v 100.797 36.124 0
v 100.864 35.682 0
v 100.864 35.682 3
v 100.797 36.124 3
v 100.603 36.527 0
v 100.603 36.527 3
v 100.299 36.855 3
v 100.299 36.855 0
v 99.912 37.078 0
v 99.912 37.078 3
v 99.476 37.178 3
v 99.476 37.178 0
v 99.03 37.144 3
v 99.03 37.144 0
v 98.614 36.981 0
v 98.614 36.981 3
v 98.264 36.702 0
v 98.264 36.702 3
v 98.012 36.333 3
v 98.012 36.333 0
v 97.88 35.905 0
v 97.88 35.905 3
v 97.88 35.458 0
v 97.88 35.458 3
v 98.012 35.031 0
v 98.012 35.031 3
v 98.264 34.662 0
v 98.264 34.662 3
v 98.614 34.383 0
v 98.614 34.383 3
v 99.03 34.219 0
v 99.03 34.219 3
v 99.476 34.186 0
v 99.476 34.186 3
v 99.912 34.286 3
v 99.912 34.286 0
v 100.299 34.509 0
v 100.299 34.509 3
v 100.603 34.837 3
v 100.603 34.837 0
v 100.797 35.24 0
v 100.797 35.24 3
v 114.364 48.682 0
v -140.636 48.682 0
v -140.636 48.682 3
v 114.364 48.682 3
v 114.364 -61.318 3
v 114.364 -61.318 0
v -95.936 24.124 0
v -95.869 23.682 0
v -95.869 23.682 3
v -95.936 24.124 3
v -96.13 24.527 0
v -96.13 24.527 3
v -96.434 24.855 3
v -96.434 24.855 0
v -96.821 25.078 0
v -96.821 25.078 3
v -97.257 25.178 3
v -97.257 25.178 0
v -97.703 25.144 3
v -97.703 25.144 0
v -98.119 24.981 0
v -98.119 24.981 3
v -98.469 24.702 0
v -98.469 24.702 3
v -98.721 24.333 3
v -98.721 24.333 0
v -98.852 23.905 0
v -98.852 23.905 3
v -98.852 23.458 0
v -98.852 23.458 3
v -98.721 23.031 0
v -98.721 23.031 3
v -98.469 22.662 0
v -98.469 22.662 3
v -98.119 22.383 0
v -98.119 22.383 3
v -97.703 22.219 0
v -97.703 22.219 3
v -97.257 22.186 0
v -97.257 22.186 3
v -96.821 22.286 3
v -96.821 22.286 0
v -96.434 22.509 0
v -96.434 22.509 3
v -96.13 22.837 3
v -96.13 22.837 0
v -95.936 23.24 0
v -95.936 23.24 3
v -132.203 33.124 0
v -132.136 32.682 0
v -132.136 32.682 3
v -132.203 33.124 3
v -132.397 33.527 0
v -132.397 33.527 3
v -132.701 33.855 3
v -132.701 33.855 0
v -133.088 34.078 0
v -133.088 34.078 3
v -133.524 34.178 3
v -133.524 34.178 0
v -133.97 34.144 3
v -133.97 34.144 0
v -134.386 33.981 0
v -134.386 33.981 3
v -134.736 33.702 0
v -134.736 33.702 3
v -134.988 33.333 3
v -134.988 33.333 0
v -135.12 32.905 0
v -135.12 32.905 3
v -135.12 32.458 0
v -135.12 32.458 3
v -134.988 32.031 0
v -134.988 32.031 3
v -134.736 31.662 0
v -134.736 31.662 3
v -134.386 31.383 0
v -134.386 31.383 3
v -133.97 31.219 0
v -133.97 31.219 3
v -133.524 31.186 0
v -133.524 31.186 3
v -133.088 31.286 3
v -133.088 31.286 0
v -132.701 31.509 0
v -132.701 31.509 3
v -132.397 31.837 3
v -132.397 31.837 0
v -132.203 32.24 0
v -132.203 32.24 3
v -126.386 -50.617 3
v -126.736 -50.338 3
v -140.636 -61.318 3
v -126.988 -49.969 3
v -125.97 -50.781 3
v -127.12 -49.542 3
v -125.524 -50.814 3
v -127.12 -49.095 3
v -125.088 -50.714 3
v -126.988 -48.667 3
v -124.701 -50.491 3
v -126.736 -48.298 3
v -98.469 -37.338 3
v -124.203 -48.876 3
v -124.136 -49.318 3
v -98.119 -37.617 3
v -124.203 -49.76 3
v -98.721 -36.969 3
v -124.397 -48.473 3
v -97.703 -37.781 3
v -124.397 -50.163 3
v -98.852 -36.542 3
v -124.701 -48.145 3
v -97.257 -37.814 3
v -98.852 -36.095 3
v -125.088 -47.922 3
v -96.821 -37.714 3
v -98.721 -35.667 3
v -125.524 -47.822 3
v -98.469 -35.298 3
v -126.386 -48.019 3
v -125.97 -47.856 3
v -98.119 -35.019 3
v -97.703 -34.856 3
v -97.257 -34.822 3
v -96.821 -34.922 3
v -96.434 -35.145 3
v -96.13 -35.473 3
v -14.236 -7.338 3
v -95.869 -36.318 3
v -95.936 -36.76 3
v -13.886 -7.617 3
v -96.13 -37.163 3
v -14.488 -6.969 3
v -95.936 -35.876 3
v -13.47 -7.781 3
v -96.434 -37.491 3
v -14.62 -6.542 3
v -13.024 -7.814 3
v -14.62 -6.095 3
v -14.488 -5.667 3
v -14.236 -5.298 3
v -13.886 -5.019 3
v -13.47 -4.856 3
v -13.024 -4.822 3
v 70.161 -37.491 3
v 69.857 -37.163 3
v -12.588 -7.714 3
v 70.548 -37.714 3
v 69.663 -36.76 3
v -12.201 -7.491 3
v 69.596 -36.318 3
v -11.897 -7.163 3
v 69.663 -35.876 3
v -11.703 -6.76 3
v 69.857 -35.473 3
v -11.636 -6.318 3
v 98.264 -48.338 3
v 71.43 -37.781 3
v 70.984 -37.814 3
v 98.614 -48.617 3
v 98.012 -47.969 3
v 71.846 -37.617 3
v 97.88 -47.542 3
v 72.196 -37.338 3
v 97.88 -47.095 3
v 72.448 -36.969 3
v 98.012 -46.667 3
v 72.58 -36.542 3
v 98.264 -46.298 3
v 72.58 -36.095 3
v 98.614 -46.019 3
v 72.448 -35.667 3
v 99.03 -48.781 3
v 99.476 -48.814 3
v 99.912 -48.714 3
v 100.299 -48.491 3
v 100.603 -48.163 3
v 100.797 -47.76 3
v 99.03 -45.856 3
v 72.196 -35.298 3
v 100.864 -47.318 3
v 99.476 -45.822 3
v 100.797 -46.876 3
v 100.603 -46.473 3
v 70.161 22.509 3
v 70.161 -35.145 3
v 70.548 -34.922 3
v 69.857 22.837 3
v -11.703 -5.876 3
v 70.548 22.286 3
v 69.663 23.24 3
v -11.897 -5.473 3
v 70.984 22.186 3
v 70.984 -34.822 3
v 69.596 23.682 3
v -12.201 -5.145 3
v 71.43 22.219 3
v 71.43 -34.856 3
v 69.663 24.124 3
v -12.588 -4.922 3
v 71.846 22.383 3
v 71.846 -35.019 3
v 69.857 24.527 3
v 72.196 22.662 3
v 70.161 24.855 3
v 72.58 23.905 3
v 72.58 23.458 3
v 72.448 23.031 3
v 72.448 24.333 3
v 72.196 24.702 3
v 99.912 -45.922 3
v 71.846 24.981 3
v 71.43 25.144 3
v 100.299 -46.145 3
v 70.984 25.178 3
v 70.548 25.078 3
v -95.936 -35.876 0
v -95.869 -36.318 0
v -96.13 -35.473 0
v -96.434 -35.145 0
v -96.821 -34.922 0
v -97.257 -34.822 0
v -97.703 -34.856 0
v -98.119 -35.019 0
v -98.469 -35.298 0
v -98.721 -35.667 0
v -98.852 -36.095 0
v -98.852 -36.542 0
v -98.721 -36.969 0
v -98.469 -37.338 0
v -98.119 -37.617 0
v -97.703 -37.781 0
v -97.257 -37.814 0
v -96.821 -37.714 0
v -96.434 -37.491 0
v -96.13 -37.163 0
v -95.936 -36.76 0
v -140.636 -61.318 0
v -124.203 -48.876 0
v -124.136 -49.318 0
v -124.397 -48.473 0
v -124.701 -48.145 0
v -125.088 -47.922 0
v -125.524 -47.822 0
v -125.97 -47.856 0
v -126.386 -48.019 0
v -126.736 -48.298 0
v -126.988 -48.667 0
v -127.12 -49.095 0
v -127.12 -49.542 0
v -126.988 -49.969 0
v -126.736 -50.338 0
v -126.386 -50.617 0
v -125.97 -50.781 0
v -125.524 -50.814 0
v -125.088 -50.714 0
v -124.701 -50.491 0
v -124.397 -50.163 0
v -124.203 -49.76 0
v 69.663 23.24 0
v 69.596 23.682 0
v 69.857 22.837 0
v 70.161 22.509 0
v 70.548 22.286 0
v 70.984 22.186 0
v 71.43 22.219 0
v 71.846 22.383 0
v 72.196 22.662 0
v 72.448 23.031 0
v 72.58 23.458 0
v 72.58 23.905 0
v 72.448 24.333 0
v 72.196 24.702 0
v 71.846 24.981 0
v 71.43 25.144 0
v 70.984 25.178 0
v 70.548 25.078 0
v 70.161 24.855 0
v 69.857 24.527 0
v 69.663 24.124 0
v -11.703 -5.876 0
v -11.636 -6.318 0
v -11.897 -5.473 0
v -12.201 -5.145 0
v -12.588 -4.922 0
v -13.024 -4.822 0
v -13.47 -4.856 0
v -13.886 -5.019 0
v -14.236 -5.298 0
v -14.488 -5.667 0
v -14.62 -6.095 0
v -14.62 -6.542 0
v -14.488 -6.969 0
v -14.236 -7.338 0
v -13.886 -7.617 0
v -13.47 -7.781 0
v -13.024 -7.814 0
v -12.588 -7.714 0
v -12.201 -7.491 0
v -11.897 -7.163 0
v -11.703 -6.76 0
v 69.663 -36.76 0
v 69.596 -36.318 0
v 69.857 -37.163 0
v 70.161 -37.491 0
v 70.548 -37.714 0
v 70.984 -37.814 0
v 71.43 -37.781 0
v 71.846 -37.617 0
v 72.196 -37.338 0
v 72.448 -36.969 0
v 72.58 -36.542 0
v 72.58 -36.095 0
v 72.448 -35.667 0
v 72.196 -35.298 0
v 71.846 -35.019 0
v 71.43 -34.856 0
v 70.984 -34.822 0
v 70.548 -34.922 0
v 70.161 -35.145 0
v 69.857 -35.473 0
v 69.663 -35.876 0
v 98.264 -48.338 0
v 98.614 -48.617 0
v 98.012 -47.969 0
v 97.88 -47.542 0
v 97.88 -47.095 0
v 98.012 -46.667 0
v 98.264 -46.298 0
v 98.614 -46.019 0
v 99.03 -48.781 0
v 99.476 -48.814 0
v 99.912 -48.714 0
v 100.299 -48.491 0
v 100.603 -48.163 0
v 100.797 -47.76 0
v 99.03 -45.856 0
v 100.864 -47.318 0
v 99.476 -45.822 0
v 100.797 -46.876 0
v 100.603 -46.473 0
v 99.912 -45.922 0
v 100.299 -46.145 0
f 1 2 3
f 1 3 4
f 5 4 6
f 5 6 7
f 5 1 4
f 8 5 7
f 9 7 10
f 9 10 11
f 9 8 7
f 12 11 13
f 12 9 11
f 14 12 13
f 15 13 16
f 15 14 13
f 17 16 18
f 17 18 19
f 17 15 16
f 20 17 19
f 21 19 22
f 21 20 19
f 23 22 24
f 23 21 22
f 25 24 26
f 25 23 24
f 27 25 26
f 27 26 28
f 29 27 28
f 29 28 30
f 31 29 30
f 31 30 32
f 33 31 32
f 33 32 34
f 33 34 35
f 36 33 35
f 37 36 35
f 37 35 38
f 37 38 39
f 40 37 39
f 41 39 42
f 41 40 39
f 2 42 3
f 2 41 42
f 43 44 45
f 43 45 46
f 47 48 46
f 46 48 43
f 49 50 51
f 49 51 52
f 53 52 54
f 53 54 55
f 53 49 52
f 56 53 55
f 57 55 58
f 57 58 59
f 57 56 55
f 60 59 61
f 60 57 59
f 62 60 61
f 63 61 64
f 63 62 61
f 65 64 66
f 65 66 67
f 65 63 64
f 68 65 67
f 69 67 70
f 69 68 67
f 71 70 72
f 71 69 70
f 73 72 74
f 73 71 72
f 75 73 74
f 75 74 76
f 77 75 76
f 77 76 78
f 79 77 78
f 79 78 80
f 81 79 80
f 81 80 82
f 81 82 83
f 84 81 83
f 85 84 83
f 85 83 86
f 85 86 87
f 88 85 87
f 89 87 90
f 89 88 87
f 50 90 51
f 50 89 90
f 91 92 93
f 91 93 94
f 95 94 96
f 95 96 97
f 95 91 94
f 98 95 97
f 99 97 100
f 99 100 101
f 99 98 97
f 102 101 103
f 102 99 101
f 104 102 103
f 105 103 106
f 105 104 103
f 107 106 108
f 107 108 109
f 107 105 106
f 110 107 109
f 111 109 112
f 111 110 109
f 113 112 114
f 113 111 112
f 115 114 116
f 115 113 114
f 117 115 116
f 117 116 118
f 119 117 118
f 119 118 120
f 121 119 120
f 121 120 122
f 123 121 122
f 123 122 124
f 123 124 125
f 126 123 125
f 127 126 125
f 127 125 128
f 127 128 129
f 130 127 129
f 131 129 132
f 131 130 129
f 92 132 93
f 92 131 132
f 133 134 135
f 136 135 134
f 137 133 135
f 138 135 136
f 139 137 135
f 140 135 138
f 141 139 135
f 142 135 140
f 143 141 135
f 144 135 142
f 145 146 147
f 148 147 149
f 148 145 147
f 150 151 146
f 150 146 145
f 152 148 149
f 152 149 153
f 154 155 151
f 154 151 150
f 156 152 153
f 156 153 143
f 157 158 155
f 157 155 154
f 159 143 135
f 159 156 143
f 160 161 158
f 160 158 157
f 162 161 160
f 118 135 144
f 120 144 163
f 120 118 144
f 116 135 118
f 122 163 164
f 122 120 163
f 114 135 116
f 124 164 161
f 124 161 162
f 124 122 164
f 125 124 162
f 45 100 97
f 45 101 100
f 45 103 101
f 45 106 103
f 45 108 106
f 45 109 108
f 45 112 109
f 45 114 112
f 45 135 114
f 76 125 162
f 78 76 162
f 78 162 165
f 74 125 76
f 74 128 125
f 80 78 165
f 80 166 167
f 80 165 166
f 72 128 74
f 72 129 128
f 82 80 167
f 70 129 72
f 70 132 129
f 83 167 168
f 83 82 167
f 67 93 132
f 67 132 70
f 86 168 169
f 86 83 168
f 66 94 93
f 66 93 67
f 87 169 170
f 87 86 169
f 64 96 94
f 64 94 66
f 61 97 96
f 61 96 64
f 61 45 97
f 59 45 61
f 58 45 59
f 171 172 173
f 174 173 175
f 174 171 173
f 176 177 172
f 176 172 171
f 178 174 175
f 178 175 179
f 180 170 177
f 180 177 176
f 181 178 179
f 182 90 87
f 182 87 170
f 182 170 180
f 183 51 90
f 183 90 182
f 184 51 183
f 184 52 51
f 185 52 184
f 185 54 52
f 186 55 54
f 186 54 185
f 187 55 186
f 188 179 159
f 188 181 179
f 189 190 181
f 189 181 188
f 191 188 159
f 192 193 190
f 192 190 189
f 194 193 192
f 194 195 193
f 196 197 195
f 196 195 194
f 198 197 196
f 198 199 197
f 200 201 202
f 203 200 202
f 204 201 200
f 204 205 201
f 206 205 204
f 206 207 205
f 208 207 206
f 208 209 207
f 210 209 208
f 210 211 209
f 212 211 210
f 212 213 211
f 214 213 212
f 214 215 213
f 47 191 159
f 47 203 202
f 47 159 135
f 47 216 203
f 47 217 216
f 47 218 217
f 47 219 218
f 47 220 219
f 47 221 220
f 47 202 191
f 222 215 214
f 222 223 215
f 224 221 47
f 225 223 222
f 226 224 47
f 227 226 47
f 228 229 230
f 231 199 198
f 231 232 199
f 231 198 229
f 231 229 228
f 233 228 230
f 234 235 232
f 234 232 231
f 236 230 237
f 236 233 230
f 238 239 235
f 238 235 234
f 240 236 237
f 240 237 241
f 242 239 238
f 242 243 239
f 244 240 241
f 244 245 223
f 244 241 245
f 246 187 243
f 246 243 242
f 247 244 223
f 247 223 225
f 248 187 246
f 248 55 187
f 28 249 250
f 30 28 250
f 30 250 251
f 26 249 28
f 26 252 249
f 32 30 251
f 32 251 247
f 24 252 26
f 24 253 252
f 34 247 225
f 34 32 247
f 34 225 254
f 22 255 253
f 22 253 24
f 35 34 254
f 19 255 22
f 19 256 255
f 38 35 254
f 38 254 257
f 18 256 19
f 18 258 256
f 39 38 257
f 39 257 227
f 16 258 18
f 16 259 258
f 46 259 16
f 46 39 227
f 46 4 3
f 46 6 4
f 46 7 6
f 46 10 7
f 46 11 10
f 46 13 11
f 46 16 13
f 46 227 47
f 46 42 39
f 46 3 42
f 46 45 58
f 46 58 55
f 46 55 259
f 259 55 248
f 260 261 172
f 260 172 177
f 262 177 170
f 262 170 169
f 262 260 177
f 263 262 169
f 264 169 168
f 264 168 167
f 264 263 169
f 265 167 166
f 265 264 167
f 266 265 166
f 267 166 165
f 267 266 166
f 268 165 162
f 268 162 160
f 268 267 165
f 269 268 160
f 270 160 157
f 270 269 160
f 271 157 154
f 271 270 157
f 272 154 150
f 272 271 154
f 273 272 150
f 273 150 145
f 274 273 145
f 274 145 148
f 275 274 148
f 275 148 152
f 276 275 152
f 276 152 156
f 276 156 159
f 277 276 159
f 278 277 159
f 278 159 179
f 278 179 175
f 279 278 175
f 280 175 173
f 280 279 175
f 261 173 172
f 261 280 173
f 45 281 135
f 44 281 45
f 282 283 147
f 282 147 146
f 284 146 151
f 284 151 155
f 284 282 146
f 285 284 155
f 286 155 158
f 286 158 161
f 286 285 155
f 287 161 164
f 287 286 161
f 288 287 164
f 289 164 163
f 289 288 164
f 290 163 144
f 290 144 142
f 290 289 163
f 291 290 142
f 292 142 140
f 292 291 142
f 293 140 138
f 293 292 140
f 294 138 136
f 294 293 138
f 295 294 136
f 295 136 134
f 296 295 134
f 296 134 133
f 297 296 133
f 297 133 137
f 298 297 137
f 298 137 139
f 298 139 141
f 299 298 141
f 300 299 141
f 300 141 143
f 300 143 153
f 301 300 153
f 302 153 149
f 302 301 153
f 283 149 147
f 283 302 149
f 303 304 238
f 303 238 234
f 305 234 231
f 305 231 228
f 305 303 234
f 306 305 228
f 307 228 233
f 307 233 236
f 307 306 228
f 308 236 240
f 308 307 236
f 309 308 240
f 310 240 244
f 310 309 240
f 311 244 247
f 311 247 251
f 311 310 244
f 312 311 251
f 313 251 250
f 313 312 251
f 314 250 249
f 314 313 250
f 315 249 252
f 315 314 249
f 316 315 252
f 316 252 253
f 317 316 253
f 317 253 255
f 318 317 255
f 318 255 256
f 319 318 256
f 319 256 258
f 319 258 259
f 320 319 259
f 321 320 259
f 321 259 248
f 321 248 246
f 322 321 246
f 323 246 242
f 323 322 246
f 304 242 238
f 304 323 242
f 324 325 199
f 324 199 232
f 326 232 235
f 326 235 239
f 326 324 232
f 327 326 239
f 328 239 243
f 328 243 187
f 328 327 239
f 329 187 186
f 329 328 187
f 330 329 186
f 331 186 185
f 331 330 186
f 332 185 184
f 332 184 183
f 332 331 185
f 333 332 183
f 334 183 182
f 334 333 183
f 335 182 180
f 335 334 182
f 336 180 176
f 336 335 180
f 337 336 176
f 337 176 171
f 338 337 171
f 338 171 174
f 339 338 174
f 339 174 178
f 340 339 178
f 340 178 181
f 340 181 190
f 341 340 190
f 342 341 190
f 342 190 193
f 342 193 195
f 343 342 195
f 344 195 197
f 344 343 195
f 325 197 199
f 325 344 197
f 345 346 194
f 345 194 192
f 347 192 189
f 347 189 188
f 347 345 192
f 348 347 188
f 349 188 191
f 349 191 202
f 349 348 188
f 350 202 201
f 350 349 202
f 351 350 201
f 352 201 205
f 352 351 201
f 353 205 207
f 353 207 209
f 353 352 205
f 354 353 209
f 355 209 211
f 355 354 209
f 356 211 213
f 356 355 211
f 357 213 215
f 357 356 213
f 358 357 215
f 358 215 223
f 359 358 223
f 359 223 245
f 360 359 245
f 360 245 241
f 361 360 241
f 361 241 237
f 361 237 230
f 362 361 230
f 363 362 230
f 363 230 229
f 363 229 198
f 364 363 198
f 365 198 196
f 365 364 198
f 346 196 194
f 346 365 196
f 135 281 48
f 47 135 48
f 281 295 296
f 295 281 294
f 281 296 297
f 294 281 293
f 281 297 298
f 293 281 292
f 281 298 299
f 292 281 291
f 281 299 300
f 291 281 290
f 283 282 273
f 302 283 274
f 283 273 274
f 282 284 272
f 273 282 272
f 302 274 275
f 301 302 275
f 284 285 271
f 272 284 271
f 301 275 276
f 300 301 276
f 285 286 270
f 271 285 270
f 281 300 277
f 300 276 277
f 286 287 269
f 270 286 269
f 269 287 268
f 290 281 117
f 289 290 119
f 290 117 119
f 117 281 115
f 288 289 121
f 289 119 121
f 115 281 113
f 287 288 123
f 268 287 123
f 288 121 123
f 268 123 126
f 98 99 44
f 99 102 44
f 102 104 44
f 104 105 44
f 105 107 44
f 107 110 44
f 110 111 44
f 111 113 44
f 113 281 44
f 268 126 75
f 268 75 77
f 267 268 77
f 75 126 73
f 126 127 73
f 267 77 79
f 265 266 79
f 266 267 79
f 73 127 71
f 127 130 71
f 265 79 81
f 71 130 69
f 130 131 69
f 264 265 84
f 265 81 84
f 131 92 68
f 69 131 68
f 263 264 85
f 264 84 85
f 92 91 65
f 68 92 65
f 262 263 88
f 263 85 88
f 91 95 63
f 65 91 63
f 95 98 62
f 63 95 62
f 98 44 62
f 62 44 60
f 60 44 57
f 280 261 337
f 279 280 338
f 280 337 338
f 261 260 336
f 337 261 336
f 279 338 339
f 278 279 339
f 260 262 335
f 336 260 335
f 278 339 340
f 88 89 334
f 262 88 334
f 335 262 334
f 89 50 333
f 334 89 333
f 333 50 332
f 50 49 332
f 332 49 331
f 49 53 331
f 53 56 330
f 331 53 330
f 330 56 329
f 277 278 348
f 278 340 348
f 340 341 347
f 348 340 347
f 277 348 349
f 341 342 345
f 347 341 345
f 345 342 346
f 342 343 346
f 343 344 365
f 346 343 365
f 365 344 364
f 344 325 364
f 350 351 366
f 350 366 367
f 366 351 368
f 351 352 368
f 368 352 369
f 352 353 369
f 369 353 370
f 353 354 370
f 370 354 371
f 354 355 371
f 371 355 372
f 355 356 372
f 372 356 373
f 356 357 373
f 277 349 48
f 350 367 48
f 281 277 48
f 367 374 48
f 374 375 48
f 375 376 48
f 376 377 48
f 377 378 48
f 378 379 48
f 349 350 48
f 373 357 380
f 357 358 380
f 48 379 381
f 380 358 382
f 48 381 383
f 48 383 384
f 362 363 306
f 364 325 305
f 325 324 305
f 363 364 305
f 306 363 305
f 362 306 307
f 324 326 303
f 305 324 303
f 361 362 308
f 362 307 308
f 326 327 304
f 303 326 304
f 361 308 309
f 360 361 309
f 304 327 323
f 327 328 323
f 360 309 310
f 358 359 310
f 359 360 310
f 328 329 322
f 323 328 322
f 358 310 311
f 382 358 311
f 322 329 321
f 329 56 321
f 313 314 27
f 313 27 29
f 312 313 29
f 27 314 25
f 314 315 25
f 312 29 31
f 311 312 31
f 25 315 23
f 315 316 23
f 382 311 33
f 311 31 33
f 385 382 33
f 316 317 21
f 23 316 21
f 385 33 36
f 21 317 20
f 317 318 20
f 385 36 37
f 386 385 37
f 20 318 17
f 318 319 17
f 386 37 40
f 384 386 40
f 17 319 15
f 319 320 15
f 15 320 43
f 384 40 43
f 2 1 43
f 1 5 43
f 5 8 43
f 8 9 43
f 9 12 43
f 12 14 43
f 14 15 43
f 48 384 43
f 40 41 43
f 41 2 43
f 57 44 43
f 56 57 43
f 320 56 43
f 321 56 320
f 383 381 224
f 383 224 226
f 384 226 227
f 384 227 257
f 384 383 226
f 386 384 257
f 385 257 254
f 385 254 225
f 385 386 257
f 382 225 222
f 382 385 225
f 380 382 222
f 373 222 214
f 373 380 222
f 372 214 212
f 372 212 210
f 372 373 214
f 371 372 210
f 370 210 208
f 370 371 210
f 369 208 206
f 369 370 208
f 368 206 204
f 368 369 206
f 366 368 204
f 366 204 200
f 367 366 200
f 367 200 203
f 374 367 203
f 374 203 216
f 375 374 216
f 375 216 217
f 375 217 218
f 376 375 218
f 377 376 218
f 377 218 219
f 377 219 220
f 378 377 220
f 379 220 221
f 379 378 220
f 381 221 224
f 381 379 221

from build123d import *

# Parameters (mm, degrees)
SKETCH1_W           = 255
SKETCH1_H           = 110
SKETCH1_R           = 1.5
BOSS_EXTRUDE1_DEPTH = 3


with BuildPart() as part:
    # Sketch1 → Boss-Extrude1 (new body)
    with BuildSketch(Plane.XY):
        with Locations((-13.136363636, -6.318181818)):
            Rectangle(SKETCH1_W, SKETCH1_H)
        with Locations((-125.636363636, -49.318181818)):
            Circle(SKETCH1_R, mode=Mode.SUBTRACT)
        with Locations((-133.636363636, 32.681818182)):
            Circle(SKETCH1_R, mode=Mode.SUBTRACT)
        with Locations((99.363636364, -47.318181818)):
            Circle(SKETCH1_R, mode=Mode.SUBTRACT)
        with Locations((99.363636364, 35.681818182)):
            Circle(SKETCH1_R, mode=Mode.SUBTRACT)
        with Locations((-97.369202936, 23.681818182)):
            Circle(SKETCH1_R, mode=Mode.SUBTRACT)
        with Locations((-97.369202936, -36.318181818)):
            Circle(SKETCH1_R, mode=Mode.SUBTRACT)
        with Locations(Location((71.096475664, -36.318181818, 0), (0, 0, 180))):
            Circle(SKETCH1_R, mode=Mode.SUBTRACT)
        with Locations(Location((71.096475664, 23.681818182, 0), (0, 0, 180))):
            Circle(SKETCH1_R, mode=Mode.SUBTRACT)
        with Locations((-13.136363636, -6.318181818)):
            Circle(SKETCH1_R, mode=Mode.SUBTRACT)
    extrude(amount=BOSS_EXTRUDE1_DEPTH)


solid = part.part
